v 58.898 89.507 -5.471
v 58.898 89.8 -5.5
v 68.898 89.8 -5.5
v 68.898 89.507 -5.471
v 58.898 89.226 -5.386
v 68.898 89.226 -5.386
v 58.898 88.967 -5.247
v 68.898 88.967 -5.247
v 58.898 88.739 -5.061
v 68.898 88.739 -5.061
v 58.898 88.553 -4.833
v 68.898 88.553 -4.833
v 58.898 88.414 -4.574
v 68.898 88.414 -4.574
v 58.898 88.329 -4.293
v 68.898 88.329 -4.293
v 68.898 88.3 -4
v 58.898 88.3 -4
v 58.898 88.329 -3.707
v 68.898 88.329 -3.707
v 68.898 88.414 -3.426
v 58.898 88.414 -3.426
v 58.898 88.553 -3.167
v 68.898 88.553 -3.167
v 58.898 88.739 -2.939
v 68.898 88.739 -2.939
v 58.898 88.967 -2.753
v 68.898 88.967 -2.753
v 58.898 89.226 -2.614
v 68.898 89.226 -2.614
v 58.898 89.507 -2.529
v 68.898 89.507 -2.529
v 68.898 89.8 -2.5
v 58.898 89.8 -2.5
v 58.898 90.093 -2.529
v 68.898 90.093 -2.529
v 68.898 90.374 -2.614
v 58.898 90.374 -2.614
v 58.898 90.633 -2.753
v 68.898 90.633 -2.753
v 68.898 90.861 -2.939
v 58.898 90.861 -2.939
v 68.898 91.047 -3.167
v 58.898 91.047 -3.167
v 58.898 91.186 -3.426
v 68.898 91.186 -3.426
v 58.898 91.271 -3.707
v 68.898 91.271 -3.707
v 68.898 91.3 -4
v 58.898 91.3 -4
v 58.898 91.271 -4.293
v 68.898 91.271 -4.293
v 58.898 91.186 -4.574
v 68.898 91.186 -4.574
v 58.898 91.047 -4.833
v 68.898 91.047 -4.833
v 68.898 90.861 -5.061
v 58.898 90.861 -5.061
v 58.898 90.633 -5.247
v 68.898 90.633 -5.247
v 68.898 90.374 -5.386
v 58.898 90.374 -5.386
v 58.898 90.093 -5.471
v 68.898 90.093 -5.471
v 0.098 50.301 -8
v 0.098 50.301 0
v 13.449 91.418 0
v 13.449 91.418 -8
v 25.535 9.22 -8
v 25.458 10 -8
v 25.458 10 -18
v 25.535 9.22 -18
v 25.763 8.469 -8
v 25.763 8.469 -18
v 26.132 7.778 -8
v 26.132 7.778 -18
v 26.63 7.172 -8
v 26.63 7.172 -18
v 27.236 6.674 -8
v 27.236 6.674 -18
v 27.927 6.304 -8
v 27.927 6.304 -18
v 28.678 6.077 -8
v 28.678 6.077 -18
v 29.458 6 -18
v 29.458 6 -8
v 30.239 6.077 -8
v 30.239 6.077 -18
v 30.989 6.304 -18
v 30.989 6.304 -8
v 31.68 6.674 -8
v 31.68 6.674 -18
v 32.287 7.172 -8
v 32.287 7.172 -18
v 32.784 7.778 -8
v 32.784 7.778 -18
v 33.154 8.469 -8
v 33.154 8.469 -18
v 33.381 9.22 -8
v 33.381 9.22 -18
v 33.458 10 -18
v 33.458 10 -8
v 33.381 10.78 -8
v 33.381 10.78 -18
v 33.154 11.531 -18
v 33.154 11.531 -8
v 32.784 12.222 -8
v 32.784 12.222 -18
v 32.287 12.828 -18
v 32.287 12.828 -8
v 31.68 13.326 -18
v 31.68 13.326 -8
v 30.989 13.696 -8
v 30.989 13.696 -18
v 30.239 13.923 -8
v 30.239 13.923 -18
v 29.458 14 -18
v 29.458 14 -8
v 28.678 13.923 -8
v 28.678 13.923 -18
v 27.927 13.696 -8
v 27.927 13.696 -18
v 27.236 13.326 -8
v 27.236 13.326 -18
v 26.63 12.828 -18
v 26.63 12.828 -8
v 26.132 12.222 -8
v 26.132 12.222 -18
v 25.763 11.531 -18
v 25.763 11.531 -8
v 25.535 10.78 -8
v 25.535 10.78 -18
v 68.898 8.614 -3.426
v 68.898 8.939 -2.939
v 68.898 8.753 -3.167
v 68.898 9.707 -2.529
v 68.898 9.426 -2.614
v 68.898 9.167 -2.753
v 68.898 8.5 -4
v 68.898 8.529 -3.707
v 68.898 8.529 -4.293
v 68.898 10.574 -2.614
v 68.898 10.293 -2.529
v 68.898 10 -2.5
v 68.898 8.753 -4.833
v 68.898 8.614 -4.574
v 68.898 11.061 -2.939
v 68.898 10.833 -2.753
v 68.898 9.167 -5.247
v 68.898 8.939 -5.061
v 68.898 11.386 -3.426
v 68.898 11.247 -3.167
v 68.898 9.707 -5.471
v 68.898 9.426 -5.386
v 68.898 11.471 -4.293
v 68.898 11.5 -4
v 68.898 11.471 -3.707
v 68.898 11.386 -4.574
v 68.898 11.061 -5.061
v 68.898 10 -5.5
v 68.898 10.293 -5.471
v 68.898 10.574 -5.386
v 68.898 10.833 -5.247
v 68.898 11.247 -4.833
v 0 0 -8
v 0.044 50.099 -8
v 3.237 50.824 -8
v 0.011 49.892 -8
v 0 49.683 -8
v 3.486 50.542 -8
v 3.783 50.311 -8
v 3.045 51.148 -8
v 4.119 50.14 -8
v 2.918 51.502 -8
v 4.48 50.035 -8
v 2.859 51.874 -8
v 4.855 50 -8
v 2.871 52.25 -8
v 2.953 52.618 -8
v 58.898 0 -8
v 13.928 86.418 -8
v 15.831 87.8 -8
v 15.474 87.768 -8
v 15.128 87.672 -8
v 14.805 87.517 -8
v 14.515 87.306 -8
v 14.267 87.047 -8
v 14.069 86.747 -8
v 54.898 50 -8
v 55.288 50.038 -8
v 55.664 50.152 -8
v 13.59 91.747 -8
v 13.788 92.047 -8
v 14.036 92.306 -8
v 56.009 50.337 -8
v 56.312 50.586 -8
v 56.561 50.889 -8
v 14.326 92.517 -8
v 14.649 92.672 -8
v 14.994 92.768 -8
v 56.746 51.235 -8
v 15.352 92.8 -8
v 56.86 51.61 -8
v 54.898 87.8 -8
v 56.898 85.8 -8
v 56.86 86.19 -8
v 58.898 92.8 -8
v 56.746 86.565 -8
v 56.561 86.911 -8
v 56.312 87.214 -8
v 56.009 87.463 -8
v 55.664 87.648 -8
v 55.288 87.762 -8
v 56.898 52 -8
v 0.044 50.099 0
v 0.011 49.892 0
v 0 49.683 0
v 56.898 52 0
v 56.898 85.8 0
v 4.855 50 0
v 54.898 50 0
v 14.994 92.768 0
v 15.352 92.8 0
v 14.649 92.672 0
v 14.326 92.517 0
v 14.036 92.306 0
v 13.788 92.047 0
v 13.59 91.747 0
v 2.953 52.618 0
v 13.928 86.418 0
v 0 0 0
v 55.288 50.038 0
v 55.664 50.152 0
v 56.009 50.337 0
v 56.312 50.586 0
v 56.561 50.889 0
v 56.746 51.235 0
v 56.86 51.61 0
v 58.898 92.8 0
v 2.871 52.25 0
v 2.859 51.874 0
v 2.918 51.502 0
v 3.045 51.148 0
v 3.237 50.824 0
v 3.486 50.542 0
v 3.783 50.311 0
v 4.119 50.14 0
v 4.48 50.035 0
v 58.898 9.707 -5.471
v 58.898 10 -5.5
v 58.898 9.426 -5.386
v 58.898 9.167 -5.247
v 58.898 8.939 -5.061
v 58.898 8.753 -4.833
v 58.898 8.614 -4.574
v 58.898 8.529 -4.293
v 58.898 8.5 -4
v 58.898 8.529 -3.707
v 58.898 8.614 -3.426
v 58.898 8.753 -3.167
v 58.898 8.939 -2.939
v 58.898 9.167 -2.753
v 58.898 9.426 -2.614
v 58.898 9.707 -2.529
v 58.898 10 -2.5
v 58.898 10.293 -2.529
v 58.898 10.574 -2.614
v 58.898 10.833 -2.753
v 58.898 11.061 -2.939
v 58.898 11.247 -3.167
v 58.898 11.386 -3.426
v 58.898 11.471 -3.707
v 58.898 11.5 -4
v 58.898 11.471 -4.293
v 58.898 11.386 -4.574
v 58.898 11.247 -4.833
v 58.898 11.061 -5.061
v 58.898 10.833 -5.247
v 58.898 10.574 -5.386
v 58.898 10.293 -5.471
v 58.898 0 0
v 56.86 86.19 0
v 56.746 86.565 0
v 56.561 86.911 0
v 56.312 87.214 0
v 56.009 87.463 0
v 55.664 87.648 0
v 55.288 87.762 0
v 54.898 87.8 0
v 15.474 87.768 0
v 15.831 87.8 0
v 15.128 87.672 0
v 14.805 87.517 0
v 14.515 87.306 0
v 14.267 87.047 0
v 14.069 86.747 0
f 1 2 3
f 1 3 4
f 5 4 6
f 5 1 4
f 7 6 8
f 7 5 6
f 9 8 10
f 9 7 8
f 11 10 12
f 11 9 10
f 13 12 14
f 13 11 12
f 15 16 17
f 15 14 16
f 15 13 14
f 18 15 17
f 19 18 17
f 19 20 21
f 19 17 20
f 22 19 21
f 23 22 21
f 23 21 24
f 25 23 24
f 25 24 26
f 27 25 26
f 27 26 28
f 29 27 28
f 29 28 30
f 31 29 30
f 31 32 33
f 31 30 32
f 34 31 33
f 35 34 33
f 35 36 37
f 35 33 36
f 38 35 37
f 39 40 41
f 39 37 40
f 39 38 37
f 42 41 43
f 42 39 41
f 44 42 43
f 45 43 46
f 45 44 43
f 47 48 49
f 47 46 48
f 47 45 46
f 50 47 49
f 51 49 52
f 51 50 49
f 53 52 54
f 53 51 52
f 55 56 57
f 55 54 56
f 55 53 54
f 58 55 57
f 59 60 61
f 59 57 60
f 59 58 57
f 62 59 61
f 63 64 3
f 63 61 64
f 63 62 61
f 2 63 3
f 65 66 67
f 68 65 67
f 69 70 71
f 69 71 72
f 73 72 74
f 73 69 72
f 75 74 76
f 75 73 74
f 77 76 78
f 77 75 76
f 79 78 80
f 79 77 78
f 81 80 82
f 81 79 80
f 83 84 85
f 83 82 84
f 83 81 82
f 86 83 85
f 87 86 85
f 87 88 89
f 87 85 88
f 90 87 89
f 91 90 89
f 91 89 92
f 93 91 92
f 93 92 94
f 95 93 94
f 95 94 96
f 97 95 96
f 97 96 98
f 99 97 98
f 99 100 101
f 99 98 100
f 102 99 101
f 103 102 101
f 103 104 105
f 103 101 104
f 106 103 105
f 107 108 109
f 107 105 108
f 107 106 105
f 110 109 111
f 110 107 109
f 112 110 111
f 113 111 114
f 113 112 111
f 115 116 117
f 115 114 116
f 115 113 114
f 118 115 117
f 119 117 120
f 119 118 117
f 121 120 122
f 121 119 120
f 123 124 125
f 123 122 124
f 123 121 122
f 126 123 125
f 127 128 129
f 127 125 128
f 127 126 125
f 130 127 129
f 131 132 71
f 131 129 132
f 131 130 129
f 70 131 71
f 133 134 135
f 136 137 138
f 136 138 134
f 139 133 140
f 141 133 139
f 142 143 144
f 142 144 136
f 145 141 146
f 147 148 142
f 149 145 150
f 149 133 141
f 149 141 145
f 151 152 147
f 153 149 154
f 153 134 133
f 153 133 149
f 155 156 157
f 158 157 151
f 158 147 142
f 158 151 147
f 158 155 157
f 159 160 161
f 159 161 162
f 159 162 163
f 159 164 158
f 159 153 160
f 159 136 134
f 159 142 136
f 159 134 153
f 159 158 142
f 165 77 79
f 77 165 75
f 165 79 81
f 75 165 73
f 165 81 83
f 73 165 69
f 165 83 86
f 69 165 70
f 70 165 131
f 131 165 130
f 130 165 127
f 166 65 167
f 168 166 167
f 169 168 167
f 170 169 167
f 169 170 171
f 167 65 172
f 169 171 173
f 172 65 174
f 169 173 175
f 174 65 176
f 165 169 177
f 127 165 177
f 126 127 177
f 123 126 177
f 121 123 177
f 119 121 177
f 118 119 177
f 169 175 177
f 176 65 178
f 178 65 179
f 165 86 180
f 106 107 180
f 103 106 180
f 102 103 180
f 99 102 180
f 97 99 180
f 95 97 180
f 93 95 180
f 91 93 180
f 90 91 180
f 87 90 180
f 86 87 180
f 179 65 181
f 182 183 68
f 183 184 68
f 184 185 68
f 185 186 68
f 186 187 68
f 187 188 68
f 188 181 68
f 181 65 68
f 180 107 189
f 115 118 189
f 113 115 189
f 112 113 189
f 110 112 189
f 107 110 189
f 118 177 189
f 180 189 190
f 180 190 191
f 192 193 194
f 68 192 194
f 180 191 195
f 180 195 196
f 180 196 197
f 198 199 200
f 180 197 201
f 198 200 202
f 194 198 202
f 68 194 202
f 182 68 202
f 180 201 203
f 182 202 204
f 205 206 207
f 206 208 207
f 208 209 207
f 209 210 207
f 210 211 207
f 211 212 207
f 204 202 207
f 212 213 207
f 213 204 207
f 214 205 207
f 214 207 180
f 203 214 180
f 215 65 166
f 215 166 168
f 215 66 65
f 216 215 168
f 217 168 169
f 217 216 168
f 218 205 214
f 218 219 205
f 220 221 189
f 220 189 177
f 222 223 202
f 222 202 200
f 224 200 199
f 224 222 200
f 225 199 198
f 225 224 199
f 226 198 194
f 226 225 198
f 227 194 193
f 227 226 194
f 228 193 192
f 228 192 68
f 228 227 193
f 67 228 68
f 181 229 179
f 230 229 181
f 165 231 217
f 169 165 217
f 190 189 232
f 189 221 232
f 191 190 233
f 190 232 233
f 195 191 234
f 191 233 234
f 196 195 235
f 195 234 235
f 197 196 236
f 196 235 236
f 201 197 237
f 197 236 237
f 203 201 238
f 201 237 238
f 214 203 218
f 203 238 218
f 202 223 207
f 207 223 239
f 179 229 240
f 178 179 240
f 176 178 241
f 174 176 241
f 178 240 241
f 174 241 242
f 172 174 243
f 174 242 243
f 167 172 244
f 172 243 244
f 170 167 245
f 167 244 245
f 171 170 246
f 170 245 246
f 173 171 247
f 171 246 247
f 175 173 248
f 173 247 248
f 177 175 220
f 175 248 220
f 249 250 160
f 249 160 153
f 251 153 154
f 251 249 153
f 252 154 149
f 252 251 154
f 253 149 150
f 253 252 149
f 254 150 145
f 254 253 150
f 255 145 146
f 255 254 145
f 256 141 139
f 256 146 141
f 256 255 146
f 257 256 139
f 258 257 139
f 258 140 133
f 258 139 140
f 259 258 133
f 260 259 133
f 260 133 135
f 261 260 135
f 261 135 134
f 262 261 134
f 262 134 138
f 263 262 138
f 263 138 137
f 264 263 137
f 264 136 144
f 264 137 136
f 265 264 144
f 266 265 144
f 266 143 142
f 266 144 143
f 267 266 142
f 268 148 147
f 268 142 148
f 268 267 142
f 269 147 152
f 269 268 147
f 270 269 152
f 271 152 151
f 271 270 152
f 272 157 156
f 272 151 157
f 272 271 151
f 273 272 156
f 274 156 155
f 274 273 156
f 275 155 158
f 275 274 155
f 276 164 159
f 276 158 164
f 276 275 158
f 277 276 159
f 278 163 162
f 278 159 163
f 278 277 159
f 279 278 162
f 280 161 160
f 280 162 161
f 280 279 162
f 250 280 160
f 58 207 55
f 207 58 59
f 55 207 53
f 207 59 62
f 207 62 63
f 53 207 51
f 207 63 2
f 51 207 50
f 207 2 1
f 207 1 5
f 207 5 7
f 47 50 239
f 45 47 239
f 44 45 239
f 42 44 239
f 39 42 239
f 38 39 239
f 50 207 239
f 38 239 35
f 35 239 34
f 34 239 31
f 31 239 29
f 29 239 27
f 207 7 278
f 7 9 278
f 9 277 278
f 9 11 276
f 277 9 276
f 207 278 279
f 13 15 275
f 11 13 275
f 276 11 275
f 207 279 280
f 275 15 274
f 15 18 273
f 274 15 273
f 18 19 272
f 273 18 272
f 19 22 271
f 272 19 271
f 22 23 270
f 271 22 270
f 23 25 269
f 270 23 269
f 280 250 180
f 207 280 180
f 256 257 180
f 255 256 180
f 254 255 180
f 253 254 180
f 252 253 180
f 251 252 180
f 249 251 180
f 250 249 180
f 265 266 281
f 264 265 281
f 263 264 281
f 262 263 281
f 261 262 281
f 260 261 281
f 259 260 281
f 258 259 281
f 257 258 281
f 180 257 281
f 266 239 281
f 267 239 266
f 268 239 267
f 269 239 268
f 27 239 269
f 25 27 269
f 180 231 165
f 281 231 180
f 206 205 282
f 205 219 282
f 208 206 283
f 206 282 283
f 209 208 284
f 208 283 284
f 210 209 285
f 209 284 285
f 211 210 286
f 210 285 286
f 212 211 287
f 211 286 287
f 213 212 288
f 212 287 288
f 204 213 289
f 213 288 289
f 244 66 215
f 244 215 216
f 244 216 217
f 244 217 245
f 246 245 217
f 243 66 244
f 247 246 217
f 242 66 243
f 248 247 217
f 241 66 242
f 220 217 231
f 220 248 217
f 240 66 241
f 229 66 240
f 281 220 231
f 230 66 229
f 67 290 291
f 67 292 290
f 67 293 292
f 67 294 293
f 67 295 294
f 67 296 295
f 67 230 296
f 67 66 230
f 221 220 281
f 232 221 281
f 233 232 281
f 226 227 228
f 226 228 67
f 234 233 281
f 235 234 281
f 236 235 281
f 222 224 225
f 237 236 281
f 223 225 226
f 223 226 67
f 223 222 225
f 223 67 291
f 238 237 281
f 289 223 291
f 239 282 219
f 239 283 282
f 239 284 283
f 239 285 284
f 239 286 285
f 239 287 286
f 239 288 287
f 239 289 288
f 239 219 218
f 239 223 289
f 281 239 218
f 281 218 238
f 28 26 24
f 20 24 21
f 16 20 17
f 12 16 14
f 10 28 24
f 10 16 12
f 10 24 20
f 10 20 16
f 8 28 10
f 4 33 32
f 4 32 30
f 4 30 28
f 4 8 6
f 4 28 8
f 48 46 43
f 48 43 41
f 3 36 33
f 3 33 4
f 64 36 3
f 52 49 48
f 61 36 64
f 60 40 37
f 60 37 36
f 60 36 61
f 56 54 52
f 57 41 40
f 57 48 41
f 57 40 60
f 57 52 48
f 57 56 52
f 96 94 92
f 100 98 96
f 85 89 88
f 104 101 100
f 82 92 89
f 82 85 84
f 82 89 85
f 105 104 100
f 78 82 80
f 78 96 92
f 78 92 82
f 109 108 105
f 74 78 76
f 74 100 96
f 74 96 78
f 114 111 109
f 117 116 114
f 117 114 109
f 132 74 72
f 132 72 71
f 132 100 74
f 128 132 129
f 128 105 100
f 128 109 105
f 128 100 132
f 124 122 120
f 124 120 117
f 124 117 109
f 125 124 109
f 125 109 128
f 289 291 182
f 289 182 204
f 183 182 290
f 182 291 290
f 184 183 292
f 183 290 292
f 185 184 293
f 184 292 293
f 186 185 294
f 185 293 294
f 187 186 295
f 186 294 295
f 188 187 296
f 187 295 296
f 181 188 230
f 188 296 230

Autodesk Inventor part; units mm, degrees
ref_plane "YZ Plane" through (0, 0, 0) normal (1, 0, 0) x (0, 1, 0)
ref_plane "XZ Plane" through (0, 0, 0) normal (0, 1, 0) x (-1, 0, 0)
ref_plane "XY Plane" through (0, 0, 0) normal (0, 0, 1) x (1, 0, 0)
sketch "Boceto1" plane through (0, 0, 0) normal (0, 0, 1) x (1, 0, 0)
  line L0 (0, 0) -> (0, 49.6834)
  line L1 (0.0978, 50.3011) -> (13.4493, 91.4177)
  line L2 (58.8982, 92.8) -> (58.8982, 0)
  arc A0 (15.3516, 92.8) -> (13.4493, 91.4177) centre (15.3516, 90.8) ccw
  arc A1 (0.0978, 50.3011) -> (0, 49.6834) centre (2, 49.6834) ccw
  line L3 (2.9528, 52.6177) -> (13.9285, 86.4177)
  line L4 (15.8307, 87.8) -> (54.8982, 87.8)
  line L5 (56.8982, 85.8) -> (56.8982, 52)
  line L6 (54.8982, 50) -> (4.8551, 50)
  arc A2 (15.8307, 87.8) -> (13.9285, 86.4177) centre (15.8307, 85.8) ccw
  arc A3 (56.8982, 85.8) -> (54.8982, 87.8) centre (54.8982, 85.8) ccw
  arc A4 (54.8982, 50) -> (56.8982, 52) centre (54.8982, 52) ccw
  arc A5 (2.9528, 52.6177) -> (4.8551, 50) centre (4.8551, 52) ccw
  line L7 (0, 0) -> (58.8982, 0)
  line L8 (15.3516, 92.8) -> (58.8982, 92.8)
  point P0 (0, 50)
  point P1 (13.8982, 92.8)
  point P2 (2.1028, 50)
  point P3 (0.0246, 49.9961)
  dimension "d31" = 45
  dimension "d32" = 50
  dimension "d33" = 45
  dimension "d43" = 2
  dimension "d48" = 2
  dimension "d49" = 2
  dimension "d50" = 2
  dimension "d57" = 92.8
  dimension "d58" = 5
  dimension "d59" = 13.4493
  dimension "d60" = 162.01
extrude "Extrusión3" add sketch "Boceto1" against normal blind 8
sketch "Boceto2" plane through (58.8982, 0, 0) normal (1, 0, 0) x (0, 0, -1)
  circle A0 centre (4, 10) radius 1.5
  circle A1 centre (4, 89.8) radius 1.5
  line L0 (0, 0) -> (8, 0) projected
  line L1 (0, 0) -> (0, 49.6834) projected
  line L2 (0, 92.8) -> (8, 92.8) projected
  line L3 (0, 92.8) -> (0, 0) projected
  dimension "d61" = 3
  dimension "d62" = 10
  dimension "d63" = 4
  dimension "d64" = 3
  dimension "d65" = 4
extrude "Extrusión4" add sketch "Boceto2" along normal blind 10
sketch "Boceto3" plane through (0, 0, -8) normal (0, 0, -1) x (-1, 0, 0)
  circle A0 centre (-29.4582, 10) radius 4
  line L0 (-58.8982, 0) -> (0, 0) projected
  line L1 (-58.8982, 92.8) -> (-58.8982, 0) projected
  dimension "d68" = 10
  dimension "d69" = 29.44
  dimension "d72" = 8
extrude "Extrusión5" add sketch "Boceto3" along normal blind 10
properties part number "Puerta"
